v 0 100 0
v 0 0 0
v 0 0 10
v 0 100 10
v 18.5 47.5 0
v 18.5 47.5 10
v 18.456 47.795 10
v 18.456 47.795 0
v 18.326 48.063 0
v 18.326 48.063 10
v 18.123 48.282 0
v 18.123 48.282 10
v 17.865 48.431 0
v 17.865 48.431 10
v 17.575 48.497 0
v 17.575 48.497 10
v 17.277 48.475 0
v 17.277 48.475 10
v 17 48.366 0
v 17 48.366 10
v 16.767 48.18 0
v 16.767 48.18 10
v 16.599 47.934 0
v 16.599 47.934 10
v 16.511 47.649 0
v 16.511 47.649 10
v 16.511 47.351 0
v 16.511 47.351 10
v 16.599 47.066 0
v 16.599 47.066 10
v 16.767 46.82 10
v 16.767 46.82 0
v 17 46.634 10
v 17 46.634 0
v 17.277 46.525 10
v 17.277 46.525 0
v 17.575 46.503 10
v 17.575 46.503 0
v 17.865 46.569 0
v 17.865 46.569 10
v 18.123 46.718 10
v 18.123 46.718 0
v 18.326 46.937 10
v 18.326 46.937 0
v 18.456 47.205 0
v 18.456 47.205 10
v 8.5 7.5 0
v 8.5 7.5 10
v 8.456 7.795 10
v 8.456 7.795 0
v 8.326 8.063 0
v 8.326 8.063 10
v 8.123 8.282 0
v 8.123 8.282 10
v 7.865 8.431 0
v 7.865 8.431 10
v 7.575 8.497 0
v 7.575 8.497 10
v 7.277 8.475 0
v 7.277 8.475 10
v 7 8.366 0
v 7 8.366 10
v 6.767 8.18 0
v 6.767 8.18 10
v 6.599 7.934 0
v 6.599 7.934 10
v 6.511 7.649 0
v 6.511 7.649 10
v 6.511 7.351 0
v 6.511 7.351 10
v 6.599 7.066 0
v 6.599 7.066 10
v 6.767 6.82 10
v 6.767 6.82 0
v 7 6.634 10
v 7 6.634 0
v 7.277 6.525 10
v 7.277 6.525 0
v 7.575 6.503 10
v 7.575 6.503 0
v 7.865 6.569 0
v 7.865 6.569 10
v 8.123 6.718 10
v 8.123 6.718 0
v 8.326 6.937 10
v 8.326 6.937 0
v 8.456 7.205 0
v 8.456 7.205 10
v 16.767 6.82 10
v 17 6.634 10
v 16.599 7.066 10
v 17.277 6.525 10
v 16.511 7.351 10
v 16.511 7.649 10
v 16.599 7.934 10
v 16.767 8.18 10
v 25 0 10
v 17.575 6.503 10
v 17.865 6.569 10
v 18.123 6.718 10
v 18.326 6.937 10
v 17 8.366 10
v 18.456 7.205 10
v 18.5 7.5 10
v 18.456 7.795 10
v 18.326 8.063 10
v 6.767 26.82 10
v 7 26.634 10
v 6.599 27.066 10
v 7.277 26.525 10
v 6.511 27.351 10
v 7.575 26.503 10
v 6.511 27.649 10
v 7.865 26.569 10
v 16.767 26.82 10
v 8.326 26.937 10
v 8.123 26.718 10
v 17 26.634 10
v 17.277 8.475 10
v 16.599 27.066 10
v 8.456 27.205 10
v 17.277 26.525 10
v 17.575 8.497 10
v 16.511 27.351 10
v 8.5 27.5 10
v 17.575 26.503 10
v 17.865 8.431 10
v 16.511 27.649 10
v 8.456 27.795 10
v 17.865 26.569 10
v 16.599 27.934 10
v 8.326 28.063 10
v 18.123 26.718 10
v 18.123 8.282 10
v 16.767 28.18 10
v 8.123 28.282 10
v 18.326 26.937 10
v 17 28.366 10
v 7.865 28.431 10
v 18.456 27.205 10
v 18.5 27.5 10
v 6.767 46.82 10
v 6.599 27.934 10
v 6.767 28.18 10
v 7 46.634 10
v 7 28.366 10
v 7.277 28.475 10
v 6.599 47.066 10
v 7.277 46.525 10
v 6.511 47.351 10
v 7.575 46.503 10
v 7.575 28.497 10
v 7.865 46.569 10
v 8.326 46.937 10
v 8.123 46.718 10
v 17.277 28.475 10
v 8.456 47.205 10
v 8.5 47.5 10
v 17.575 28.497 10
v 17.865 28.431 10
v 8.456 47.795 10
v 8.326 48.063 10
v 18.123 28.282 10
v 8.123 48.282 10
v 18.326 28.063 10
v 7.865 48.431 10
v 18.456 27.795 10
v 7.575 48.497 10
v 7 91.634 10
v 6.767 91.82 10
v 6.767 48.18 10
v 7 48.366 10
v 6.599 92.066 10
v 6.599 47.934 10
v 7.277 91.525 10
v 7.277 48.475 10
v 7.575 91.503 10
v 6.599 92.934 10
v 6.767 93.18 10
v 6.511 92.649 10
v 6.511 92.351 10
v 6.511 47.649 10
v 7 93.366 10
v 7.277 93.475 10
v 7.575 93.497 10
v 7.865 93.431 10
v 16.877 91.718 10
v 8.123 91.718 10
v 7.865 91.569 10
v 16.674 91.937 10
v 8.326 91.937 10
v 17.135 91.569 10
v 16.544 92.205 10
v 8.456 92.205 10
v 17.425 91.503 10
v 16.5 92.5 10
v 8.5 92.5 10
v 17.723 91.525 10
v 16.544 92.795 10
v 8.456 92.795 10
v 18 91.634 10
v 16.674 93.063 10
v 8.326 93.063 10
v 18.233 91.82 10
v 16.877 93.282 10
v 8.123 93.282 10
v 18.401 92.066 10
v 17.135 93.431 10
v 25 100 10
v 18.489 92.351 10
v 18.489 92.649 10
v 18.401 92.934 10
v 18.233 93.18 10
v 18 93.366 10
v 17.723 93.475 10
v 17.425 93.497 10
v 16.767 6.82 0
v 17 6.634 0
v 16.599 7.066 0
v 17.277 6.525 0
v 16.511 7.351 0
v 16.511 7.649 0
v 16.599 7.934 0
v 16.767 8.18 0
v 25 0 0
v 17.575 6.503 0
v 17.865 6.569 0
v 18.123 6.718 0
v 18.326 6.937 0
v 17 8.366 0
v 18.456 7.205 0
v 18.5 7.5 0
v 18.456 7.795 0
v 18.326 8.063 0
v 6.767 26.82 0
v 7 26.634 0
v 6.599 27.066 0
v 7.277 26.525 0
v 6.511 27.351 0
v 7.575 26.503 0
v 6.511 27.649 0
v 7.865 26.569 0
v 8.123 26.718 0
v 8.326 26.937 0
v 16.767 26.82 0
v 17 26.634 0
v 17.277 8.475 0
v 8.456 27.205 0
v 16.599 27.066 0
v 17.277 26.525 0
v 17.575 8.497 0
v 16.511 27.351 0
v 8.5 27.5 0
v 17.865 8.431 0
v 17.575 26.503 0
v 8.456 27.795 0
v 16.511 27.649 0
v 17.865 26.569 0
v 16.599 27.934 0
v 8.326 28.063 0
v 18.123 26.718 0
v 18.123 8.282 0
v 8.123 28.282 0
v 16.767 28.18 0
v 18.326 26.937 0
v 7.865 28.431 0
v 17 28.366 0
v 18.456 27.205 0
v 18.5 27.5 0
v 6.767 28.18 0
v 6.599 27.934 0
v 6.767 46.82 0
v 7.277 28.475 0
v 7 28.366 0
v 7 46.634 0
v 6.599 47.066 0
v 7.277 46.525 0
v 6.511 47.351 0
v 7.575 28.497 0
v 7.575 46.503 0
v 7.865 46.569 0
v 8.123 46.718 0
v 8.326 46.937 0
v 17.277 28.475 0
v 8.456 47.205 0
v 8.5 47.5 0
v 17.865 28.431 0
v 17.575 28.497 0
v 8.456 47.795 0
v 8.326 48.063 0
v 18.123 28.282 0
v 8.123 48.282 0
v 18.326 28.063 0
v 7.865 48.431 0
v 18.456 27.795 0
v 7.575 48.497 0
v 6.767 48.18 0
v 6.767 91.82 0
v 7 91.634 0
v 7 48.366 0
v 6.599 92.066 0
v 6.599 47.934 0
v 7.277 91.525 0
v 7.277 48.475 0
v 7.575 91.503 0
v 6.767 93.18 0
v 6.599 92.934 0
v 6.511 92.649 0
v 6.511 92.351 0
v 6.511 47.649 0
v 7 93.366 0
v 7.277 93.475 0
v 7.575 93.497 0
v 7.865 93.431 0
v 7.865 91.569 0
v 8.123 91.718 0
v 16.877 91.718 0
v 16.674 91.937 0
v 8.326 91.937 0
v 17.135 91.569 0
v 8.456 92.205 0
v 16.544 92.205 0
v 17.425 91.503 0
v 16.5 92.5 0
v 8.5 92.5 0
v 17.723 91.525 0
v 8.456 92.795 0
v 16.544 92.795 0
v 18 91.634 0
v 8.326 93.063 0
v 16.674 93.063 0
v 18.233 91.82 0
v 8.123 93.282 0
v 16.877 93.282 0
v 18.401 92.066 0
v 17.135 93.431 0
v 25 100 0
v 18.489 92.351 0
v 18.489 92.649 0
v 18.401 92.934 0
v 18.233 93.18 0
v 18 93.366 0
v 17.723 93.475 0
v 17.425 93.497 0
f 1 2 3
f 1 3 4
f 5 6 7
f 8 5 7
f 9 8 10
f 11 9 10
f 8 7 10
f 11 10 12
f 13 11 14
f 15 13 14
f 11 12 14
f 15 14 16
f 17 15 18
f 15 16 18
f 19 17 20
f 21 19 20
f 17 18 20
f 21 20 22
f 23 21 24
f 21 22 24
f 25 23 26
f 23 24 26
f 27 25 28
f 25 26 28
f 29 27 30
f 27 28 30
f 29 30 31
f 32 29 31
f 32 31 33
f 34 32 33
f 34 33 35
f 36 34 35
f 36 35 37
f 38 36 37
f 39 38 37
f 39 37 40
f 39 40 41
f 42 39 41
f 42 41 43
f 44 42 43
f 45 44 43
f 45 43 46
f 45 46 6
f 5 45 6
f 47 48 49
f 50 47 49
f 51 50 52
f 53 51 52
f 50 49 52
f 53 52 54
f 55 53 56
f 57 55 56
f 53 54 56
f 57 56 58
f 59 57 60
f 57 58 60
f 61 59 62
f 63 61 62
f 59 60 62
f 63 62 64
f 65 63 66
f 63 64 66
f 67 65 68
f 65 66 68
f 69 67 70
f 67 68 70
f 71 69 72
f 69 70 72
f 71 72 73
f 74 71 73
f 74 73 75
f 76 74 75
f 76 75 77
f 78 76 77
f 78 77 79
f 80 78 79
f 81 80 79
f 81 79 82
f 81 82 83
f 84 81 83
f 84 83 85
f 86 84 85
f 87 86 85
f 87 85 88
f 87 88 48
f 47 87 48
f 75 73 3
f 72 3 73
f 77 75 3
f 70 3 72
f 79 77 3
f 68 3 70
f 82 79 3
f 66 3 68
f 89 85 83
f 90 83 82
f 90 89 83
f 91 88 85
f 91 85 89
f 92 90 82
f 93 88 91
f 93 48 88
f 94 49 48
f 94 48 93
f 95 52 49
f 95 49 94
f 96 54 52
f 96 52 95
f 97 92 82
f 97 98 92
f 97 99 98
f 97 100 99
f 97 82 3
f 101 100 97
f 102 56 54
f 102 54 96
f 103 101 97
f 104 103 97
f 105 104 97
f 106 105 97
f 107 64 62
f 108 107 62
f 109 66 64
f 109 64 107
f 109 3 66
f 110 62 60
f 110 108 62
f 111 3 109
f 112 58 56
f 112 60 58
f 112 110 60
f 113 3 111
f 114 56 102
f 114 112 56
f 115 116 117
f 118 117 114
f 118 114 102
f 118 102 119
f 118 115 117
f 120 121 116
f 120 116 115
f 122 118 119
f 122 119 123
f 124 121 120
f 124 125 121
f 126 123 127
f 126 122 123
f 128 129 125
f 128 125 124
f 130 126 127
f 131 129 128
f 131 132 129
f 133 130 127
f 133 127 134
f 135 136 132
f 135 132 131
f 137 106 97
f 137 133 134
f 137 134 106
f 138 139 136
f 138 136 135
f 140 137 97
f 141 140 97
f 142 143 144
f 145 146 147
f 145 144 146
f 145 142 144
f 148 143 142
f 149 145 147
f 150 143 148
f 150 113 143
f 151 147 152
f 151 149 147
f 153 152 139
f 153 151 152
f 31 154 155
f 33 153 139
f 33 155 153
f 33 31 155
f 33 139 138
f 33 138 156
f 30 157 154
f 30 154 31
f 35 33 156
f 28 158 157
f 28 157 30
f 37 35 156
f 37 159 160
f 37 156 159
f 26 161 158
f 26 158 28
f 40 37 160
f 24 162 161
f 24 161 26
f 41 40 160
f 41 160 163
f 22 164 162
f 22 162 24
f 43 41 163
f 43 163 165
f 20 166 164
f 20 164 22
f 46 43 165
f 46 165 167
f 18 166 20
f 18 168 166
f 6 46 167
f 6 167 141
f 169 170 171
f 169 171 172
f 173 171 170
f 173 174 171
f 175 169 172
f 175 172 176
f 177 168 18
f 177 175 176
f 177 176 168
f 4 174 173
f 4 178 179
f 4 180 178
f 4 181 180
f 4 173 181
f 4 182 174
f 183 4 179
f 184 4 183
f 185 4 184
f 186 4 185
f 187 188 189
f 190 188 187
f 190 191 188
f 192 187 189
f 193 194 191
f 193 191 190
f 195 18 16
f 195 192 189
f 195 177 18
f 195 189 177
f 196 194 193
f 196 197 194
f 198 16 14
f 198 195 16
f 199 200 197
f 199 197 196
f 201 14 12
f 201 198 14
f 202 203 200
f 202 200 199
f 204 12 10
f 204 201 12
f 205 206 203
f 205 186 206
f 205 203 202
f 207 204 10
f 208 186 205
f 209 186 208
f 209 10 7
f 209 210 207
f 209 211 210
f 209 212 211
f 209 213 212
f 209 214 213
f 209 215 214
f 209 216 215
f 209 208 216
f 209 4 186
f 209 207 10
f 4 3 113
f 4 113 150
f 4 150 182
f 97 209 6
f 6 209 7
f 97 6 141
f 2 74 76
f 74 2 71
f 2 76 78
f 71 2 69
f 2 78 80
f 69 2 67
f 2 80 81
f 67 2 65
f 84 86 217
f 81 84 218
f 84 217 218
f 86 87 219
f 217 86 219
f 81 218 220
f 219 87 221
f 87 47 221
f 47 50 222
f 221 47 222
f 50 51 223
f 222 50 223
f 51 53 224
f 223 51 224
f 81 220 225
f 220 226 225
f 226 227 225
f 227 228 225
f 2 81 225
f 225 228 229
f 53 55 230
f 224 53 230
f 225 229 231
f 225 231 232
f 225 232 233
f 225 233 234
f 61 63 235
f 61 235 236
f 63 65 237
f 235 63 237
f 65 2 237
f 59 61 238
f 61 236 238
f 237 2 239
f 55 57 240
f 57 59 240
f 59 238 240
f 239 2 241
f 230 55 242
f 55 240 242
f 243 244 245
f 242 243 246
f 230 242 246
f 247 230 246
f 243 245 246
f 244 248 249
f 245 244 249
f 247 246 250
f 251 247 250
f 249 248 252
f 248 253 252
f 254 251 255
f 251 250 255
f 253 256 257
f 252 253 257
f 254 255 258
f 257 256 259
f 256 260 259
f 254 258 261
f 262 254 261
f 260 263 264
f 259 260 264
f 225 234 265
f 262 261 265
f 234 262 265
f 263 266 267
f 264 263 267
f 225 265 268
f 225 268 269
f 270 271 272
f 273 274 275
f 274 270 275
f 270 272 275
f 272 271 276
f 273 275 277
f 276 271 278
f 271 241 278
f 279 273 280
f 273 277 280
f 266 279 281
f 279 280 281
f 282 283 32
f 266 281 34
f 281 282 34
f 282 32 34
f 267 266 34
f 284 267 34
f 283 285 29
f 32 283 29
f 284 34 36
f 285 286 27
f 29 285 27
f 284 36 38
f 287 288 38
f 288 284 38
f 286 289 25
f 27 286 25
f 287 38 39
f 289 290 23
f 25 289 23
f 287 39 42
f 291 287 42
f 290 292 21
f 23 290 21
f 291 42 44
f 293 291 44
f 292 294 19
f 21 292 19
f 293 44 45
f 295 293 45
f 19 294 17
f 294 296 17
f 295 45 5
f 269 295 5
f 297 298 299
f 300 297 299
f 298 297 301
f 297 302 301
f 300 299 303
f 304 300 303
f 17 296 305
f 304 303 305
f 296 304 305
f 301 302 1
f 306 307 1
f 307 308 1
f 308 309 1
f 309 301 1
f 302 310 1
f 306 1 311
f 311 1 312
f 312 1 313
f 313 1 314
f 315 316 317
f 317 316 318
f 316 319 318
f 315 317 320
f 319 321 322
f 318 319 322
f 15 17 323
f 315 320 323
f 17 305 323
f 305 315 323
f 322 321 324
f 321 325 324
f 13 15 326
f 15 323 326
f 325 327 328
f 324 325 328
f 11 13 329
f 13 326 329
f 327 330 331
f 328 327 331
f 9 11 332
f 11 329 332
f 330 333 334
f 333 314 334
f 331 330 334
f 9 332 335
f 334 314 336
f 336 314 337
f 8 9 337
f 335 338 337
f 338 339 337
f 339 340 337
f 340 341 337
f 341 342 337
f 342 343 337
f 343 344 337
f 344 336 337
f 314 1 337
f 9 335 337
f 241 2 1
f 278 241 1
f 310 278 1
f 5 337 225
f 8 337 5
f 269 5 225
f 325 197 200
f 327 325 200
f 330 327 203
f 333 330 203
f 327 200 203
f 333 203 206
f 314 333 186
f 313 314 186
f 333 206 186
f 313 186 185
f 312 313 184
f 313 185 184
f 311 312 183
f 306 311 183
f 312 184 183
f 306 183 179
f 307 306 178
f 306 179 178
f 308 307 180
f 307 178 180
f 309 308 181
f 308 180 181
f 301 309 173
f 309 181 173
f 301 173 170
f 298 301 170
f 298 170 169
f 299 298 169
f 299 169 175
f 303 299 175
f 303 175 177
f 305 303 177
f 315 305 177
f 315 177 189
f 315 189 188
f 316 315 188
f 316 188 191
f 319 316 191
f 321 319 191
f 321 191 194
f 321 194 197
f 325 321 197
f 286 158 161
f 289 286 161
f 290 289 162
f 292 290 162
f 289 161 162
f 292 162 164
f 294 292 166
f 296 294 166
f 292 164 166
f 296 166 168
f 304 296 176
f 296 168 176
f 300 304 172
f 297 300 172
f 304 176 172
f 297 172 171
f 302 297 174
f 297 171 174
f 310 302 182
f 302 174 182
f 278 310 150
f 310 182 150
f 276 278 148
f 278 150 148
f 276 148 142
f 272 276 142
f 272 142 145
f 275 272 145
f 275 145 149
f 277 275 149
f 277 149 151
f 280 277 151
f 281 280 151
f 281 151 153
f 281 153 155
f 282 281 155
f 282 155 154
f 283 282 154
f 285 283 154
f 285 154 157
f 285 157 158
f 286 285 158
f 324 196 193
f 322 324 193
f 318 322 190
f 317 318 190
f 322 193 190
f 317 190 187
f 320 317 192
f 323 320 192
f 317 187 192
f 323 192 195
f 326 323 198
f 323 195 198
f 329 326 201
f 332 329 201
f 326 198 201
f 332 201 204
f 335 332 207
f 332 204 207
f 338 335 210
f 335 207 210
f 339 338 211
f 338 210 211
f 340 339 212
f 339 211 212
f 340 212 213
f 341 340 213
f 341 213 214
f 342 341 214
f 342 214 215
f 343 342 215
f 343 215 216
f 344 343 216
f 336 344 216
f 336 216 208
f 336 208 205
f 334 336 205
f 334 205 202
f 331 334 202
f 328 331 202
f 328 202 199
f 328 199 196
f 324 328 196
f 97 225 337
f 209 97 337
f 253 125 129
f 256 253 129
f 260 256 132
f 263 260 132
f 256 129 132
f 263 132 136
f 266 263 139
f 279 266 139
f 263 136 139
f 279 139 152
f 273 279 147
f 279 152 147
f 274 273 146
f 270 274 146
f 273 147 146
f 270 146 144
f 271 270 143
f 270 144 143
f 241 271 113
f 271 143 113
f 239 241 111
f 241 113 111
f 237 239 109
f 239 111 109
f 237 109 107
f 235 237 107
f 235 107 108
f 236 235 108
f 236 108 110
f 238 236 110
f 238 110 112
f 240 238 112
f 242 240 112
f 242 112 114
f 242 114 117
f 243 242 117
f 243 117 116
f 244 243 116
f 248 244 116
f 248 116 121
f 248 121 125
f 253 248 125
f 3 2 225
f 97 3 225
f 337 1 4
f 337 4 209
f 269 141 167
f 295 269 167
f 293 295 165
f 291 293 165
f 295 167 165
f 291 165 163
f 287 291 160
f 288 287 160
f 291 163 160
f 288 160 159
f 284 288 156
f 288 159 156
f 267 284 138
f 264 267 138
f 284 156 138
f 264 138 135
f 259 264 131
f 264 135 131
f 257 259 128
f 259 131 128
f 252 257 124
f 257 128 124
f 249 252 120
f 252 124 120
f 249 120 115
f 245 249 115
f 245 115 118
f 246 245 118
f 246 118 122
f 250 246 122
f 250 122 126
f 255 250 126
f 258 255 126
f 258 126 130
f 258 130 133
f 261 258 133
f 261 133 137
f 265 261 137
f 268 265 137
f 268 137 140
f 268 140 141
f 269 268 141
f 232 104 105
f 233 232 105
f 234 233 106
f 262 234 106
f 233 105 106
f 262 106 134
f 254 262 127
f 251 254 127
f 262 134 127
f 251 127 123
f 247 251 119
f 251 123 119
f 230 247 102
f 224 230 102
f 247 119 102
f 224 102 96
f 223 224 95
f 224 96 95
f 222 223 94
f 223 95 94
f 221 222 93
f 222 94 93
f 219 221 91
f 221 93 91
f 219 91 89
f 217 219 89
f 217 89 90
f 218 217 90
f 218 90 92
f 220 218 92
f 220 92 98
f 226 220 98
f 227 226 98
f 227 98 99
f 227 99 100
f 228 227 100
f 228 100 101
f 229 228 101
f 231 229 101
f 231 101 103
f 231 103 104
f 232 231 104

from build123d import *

# Parameters (mm, degrees)
SKETCH1_W           = 25
SKETCH1_H           = 100
BOSS_EXTRUDE1_DEPTH = 10
SKETCH2_R           = 1
CUT_EXTRUDE1_DEPTH  = 104.561575886


with BuildPart() as part:
    # Sketch1 → Boss-Extrude1 (new body)
    with BuildSketch(Plane.XY):
        with Locations((12.5, 50)):
            Rectangle(SKETCH1_W, SKETCH1_H)
    extrude(amount=BOSS_EXTRUDE1_DEPTH)

    # Sketch2 → Cut-Extrude1 (cut, through all)
    with BuildSketch(Plane.XY.offset(10)):
        with Locations((7.5, 92.5)):
            Circle(SKETCH2_R)
        with Locations((17.5, 47.5)):
            Circle(SKETCH2_R)
        with Locations((7.5, 47.5)):
            Circle(SKETCH2_R)
        with Locations((17.5, 27.5)):
            Circle(SKETCH2_R)
        with Locations((7.5, 27.5)):
            Circle(SKETCH2_R)
        with Locations((17.5, 7.5)):
            Circle(SKETCH2_R)
        with Locations((7.5, 7.5)):
            Circle(SKETCH2_R)
        with Locations(Location((17.5, 92.5, 0), (0, 0, 180))):
            Circle(SKETCH2_R)
    extrude(amount=-CUT_EXTRUDE1_DEPTH, mode=Mode.SUBTRACT)


solid = part.part
